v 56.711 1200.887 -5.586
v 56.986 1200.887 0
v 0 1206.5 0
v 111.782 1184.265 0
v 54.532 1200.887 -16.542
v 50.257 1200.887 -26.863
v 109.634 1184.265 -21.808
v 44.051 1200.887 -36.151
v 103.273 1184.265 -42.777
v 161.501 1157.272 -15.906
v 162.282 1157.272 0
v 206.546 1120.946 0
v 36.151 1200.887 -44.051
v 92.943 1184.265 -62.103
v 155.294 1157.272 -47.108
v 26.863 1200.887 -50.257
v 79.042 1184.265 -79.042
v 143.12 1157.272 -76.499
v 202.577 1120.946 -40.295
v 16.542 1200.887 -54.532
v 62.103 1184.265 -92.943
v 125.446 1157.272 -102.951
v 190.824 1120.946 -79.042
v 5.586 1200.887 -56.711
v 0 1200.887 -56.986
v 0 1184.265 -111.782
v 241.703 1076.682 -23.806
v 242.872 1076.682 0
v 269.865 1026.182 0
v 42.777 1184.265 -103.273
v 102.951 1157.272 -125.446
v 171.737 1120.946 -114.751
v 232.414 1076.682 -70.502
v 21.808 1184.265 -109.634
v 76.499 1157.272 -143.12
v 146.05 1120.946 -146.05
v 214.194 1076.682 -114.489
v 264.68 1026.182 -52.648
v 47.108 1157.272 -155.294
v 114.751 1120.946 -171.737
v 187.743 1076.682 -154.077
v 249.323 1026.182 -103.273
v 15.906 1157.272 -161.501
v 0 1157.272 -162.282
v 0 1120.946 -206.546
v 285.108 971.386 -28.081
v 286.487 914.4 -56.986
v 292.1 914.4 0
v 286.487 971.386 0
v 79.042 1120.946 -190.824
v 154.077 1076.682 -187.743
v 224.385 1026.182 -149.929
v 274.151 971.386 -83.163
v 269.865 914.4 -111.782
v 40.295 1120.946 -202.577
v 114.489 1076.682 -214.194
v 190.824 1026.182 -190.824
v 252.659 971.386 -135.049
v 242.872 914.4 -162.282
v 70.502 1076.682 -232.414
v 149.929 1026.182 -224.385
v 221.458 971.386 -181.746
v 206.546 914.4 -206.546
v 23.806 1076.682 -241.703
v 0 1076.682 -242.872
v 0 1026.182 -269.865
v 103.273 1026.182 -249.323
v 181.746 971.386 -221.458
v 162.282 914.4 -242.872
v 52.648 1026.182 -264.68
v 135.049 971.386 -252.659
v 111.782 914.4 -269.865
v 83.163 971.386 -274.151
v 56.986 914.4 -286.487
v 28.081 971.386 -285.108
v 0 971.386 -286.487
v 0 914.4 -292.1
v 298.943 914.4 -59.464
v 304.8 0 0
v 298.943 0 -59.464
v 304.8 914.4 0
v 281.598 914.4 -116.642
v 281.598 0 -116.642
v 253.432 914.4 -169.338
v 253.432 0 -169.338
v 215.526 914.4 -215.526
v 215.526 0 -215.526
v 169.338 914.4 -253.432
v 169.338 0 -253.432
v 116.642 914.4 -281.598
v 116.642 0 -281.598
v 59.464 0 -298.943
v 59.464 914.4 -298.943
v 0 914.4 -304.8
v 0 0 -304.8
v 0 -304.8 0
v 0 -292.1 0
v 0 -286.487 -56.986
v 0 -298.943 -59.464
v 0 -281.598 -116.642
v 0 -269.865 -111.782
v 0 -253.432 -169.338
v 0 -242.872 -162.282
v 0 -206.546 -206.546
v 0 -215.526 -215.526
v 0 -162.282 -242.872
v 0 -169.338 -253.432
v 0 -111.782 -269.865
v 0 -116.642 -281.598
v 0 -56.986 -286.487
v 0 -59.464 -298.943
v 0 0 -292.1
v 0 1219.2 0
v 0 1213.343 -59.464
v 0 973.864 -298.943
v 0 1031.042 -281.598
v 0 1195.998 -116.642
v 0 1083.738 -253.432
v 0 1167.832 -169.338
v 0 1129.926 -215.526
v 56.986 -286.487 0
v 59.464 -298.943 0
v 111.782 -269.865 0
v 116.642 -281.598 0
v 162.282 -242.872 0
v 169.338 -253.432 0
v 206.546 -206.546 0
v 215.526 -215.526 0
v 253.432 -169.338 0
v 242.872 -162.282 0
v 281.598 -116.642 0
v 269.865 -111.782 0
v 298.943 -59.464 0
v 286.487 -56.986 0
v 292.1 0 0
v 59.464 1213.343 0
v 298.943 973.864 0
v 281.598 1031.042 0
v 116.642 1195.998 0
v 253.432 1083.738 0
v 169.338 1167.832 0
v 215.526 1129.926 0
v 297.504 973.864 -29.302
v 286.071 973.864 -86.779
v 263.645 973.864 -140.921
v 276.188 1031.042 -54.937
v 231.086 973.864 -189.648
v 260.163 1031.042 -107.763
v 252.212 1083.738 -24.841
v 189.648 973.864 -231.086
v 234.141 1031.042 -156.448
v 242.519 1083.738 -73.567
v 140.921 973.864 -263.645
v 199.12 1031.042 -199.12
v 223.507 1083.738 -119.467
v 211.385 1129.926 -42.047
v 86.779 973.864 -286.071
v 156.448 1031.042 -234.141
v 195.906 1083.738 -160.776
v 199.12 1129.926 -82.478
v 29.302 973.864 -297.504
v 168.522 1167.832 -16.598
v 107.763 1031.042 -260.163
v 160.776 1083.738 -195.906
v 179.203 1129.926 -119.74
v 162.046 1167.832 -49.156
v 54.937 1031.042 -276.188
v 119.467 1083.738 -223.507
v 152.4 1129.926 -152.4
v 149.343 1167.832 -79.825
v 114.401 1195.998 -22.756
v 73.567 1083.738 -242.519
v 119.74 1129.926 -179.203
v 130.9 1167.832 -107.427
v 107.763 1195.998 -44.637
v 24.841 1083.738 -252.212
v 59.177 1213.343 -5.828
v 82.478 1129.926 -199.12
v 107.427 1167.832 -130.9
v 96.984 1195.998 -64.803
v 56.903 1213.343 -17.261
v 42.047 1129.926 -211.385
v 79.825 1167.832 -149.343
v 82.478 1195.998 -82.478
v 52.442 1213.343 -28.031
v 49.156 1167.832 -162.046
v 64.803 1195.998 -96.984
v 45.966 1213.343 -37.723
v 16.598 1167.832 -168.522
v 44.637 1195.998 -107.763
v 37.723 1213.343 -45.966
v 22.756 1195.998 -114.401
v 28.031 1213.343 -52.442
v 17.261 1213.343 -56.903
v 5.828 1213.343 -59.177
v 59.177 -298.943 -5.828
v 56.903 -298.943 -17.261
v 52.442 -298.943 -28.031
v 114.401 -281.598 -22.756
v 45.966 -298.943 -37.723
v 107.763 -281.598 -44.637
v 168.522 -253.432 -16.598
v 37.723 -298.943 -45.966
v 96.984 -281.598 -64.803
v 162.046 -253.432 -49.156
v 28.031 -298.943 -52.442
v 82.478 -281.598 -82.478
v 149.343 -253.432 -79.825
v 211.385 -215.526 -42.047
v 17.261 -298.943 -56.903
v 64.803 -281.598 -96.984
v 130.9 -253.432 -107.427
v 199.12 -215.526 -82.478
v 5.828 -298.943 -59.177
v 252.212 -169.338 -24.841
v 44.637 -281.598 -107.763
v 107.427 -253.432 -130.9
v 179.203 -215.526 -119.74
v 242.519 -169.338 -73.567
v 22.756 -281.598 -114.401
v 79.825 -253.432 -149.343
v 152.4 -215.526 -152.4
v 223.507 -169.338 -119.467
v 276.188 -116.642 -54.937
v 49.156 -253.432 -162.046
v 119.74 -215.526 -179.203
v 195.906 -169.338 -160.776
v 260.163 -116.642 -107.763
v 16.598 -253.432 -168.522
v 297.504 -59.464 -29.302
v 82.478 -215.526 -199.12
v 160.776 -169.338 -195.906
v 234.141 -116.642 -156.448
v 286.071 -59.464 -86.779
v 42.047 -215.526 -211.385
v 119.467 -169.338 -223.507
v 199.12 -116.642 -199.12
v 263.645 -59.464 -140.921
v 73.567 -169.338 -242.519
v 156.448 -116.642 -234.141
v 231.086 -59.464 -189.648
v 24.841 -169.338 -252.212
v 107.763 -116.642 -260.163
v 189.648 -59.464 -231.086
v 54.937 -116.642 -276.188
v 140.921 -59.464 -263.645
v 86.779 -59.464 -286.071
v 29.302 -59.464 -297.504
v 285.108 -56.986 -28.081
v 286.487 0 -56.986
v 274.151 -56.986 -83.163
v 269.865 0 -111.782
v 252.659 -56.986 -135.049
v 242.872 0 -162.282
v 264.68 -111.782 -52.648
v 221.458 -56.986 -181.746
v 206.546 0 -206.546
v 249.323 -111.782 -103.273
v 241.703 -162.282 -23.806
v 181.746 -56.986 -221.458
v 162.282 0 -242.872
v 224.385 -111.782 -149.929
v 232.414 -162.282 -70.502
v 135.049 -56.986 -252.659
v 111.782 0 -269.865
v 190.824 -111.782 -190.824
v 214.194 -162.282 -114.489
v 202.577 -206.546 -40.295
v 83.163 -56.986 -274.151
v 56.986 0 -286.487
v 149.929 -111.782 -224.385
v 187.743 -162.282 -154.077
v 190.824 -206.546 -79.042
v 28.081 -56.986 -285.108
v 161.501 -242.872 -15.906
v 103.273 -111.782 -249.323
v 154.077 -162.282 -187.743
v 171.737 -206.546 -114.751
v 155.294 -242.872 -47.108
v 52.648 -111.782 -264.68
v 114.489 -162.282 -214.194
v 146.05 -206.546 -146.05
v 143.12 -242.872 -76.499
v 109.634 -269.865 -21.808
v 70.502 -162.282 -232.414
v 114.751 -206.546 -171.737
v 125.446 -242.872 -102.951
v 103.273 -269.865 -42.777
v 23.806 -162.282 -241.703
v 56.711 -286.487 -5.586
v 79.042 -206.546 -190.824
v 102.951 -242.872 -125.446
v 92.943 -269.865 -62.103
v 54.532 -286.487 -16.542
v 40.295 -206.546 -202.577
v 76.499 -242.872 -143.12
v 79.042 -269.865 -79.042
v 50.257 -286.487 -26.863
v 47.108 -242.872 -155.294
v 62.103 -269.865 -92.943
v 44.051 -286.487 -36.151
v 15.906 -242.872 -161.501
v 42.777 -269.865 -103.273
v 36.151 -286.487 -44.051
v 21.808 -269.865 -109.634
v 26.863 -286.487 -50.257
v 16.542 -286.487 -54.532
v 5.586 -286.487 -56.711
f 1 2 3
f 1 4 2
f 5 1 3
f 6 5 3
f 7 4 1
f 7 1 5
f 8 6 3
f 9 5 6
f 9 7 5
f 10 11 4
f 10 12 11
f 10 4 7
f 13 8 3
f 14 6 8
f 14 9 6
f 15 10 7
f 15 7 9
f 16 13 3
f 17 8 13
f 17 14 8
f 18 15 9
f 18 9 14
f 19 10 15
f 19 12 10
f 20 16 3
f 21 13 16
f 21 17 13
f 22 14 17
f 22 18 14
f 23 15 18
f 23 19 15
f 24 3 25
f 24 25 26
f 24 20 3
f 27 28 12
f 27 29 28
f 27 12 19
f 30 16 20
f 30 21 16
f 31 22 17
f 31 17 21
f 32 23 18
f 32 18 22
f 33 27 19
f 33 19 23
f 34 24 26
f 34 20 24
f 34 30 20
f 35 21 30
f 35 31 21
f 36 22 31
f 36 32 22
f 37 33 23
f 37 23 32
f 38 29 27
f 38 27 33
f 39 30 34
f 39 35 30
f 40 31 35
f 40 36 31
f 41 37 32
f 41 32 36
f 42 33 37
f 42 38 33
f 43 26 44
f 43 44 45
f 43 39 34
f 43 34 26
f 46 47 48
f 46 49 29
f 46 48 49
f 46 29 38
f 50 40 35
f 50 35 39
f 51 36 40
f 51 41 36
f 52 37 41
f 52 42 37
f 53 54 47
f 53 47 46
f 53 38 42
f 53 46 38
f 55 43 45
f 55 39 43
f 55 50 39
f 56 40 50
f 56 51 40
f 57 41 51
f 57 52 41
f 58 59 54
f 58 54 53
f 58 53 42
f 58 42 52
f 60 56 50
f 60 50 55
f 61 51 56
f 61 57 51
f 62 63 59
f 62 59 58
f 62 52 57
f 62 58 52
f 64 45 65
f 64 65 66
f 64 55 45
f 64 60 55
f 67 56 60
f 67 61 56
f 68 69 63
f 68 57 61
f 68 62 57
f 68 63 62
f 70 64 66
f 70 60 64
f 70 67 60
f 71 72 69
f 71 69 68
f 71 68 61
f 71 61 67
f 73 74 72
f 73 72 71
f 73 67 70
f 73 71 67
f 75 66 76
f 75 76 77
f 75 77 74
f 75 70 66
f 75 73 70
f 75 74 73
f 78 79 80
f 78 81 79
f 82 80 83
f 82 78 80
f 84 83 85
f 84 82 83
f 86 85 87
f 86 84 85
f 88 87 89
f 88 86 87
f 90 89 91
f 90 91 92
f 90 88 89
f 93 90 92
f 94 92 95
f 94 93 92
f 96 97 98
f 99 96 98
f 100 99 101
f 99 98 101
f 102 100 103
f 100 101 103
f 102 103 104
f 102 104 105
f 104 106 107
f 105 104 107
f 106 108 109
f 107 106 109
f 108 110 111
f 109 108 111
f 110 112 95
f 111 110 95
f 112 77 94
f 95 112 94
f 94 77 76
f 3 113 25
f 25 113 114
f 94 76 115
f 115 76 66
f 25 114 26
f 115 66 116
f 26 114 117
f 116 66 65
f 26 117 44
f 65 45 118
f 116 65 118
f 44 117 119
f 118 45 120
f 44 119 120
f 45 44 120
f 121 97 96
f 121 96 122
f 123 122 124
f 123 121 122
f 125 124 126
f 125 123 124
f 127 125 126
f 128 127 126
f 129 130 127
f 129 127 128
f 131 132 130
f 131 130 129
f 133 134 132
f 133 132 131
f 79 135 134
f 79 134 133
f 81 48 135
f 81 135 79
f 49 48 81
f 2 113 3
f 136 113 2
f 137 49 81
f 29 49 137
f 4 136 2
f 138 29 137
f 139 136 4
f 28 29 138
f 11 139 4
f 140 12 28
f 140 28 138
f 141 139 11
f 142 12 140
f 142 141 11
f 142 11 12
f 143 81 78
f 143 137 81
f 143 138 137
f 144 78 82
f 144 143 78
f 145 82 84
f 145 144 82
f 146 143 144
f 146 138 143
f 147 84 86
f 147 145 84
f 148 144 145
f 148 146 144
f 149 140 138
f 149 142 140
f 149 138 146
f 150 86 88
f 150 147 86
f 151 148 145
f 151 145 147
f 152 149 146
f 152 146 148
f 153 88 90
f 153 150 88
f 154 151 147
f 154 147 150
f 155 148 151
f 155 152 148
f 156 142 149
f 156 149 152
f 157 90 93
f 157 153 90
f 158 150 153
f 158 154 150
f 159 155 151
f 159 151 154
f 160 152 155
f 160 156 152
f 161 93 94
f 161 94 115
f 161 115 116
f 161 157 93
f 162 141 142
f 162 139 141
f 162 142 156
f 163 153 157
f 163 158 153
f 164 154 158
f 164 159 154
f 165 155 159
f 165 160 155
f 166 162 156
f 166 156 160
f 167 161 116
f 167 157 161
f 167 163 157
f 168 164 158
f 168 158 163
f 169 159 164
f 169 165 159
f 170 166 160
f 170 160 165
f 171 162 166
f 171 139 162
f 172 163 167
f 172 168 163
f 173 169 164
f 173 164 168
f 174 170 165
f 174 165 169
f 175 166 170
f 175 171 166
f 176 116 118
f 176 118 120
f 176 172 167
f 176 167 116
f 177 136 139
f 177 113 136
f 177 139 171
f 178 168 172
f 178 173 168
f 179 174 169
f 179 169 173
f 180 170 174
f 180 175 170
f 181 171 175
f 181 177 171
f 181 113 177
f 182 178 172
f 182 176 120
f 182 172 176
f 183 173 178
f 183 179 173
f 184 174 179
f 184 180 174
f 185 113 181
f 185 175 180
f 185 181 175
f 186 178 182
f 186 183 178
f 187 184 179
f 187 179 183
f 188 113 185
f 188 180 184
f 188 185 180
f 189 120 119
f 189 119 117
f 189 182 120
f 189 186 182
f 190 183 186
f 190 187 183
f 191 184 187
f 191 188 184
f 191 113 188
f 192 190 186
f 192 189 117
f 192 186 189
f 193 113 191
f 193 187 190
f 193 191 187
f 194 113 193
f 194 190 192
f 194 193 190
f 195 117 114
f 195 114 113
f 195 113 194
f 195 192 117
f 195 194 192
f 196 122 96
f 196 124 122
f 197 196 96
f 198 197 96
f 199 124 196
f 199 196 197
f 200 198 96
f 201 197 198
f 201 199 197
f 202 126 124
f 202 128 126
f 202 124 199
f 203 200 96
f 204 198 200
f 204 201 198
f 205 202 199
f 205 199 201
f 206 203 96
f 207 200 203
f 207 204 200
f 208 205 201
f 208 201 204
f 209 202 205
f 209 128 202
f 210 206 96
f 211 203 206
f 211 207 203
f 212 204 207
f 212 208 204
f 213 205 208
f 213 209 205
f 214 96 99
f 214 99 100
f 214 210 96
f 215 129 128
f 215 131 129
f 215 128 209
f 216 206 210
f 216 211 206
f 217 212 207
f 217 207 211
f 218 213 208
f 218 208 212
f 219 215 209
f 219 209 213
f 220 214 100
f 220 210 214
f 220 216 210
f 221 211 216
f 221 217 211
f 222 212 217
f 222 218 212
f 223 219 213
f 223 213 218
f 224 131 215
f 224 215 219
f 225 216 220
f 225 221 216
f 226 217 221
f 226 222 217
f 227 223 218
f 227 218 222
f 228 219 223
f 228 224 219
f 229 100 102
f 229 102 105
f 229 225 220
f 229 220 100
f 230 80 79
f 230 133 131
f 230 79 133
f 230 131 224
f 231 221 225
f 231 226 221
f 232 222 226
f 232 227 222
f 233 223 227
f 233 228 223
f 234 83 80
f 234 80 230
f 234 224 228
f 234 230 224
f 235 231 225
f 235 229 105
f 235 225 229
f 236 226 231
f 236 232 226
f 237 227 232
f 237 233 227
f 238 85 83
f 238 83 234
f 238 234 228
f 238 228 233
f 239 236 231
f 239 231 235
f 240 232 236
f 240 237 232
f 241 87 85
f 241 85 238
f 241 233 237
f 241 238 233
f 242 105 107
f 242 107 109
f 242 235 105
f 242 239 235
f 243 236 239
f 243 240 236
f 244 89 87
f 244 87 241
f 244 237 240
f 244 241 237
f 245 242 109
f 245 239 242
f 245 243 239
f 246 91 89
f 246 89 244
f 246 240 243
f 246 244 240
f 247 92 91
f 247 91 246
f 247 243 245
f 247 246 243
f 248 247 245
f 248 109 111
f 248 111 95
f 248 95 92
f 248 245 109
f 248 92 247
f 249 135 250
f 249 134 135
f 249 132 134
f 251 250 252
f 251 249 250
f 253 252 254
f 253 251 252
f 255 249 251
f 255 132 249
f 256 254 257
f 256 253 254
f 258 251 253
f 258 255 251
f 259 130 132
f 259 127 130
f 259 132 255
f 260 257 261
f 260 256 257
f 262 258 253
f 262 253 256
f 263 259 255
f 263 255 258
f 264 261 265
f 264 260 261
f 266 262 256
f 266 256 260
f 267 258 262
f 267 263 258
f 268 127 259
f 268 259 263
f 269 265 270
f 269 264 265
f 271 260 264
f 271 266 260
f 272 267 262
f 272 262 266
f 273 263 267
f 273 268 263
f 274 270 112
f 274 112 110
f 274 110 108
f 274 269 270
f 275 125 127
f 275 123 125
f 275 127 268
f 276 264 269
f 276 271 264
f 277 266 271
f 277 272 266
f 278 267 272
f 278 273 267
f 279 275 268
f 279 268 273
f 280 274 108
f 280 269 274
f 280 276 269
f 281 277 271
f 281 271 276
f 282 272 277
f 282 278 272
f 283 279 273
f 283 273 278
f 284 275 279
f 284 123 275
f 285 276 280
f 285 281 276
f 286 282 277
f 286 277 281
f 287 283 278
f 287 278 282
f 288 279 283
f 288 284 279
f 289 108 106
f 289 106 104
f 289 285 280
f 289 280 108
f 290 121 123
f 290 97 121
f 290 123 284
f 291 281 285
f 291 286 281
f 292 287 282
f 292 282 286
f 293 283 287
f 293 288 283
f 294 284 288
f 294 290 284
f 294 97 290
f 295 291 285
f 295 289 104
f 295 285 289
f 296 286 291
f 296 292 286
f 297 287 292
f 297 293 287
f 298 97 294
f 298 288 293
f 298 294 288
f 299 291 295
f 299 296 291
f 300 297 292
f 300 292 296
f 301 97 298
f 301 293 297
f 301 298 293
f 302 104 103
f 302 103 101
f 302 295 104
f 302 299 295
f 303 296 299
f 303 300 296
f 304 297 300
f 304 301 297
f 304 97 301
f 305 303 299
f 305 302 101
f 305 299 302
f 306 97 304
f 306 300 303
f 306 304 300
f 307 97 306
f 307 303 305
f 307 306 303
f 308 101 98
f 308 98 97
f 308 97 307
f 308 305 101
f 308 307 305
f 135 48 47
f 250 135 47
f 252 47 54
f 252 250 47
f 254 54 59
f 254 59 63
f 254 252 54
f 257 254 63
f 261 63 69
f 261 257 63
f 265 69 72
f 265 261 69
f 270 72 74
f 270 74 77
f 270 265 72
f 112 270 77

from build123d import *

# Parameters (mm, degrees)
REVOLVE1_ANGLE = 90


with BuildPart() as part:
    # Sketch1 → Revolve1 (revolve)
    with BuildSketch(Plane.XY):
        with BuildLine():
            Line((304.8, 0), (304.8, 914.4))
            ThreePointArc((304.8, 914.4), (215.526146906, 1129.926146906), (0, 1219.2))
            Line((0, 1219.2), (0, 1206.5))
            ThreePointArc((0, 1206.5), (206.545890785, 1120.945890785), (292.1, 914.4))
            Line((292.1, 914.4), (292.1, 0))
            ThreePointArc((292.1, 0), (206.545890785, -206.545890785), (0, -292.1))
            Line((0, -292.1), (0, -304.8))
            ThreePointArc((0, -304.8), (215.526146906, -215.526146906), (304.8, 0))
        make_face()
    revolve(axis=Axis((0, 1258.634144443, 0), (0, 1, 0)), revolution_arc=REVOLVE1_ANGLE)


solid = part.part
